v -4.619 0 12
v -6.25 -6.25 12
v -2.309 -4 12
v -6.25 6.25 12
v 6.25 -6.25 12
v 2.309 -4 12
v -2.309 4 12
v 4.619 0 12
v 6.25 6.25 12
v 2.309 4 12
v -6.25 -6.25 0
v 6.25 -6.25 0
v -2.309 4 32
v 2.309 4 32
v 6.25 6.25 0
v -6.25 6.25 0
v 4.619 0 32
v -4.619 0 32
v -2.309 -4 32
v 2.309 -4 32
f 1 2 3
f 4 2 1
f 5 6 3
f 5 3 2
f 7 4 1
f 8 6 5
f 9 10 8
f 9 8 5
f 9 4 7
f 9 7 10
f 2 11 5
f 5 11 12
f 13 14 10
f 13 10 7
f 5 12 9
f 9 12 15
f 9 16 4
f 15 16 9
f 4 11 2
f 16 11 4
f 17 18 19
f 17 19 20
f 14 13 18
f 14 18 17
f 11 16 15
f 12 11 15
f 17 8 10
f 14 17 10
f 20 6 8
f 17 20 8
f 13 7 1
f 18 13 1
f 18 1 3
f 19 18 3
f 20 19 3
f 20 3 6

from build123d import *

# Parameters (mm, degrees)
SKETCH_W     = 12.5
SKETCH_H     = 12.5
PAD_DEPTH    = 12
PAD001_DEPTH = 20


with BuildPart() as part:
    # Sketch → Pad (new body)
    with BuildSketch(Plane.XY):
        Rectangle(SKETCH_W, SKETCH_H)
    extrude(amount=PAD_DEPTH)

    # Sketch001 (on Face6 of Pad) → Pad001 (join)
    with BuildSketch(Plane.XY.offset(12)):
        Polygon((-2.309401, 4), (-4.618802, 0), (-2.309401, -4), (2.309401, -4), (4.618802, 0), (2.309401, 4), align=None)
    extrude(amount=PAD001_DEPTH)


solid = part.part
